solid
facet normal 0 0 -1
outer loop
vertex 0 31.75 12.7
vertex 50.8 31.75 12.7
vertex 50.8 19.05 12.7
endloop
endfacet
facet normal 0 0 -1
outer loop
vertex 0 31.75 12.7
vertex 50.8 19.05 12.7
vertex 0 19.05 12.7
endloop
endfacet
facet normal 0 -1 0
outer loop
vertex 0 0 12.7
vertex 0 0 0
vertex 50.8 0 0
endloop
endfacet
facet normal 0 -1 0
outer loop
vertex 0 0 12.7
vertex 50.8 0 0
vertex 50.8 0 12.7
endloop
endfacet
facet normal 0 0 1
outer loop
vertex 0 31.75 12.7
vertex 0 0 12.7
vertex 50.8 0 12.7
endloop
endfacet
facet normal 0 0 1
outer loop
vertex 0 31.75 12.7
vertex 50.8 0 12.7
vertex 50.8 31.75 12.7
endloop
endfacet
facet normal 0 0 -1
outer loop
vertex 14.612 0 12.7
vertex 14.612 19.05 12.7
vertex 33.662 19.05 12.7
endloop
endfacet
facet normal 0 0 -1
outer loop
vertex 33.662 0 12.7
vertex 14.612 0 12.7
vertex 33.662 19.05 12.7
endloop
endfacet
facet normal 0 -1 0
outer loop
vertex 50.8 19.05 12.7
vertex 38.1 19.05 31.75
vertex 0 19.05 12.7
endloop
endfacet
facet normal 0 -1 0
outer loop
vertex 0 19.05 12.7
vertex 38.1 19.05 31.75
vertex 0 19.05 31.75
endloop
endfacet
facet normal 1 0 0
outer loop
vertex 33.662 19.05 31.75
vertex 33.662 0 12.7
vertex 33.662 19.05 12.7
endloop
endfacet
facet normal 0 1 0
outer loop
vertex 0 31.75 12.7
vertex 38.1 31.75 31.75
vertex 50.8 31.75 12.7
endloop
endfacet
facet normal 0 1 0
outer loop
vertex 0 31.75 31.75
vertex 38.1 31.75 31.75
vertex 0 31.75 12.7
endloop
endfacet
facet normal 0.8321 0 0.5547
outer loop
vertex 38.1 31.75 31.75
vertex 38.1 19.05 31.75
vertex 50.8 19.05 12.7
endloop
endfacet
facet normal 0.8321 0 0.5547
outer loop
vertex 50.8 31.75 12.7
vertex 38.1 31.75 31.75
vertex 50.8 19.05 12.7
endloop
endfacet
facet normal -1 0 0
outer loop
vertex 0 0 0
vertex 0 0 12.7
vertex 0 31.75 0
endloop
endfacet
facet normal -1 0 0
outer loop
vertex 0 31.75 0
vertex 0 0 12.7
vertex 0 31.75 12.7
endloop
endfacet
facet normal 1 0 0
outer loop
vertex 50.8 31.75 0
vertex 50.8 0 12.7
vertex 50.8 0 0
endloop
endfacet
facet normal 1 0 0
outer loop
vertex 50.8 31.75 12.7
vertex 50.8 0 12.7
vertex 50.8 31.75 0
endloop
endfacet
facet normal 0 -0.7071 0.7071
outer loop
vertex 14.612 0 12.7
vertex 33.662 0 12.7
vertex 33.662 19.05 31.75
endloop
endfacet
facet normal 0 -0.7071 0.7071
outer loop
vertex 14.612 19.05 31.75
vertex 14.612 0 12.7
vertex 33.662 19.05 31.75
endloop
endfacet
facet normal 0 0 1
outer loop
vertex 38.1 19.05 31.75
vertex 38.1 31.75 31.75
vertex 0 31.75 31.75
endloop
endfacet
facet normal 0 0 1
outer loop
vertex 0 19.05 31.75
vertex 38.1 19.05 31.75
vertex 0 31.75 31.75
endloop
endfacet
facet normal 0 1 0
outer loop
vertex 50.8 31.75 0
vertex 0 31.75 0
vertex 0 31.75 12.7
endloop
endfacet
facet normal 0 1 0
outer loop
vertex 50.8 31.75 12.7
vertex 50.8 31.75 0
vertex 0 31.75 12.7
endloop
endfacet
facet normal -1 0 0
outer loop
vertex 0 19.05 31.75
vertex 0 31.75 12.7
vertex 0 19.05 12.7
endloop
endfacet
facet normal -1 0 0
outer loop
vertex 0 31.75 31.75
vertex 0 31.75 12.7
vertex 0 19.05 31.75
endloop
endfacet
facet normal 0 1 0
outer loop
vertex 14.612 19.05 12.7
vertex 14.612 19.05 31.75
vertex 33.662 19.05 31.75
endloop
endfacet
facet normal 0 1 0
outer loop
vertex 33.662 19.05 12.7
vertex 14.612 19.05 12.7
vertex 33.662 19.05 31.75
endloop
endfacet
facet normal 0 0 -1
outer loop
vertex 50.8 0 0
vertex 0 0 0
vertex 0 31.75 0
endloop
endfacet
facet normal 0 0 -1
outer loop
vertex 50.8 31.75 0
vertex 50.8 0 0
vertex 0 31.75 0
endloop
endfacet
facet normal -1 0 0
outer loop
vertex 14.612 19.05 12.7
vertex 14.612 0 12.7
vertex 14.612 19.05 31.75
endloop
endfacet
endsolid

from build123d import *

# Parameters (mm, degrees)
F0_W     = 31.75
F0_H     = 12.7
F1_DEPTH = 50.8
F2_W     = 50.8
F2_H     = 19.05
F3_DEPTH = 12.7
F5_DEPTH = 25.4
F6_W     = 19.05
F6_H     = 19.05
F7_DEPTH = 19.05
F9_DEPTH = 25.4


with BuildPart() as f1:
    # F0 (on Right) → F1 (new body)
    with BuildSketch(Plane.YZ):
        with Locations((15.875, 6.35)):
            Rectangle(F0_W, F0_H)
    extrude(amount=F1_DEPTH)


with BuildPart() as f3:
    # F2 (on face) → F3 (new body)
    with BuildSketch(Plane(origin=(0, 31.75, 0), x_dir=(-1, 0, 0), z_dir=(0, 1, 0))):
        with Locations((-25.4, 22.225)):
            Rectangle(F2_W, F2_H)
    extrude(amount=-F3_DEPTH)

    # F4 (on face) → F5 (cut)
    with BuildSketch(Plane.XZ.offset(-19.05)):
        Polygon((50.8, 31.75), (38.1, 31.75), (50.8, 12.7), align=None)
    extrude(amount=-F5_DEPTH, mode=Mode.SUBTRACT)


with BuildPart() as f7:
    # F6 (on face) → F7 (new body)
    with BuildSketch(Plane.XY.offset(12.7)):
        with Locations((24.136756, 9.525)):
            Rectangle(F6_W, F6_H)
    extrude(amount=F7_DEPTH)

    # F8 (on face) → F9 (cut)
    with BuildSketch(Plane.YZ.offset(33.661756)):
        Polygon((0, 12.7), (19.05, 31.75), (0, 31.75), align=None)
    extrude(amount=-F9_DEPTH, mode=Mode.SUBTRACT)


solid = Compound([f1.part, f3.part, f7.part])
